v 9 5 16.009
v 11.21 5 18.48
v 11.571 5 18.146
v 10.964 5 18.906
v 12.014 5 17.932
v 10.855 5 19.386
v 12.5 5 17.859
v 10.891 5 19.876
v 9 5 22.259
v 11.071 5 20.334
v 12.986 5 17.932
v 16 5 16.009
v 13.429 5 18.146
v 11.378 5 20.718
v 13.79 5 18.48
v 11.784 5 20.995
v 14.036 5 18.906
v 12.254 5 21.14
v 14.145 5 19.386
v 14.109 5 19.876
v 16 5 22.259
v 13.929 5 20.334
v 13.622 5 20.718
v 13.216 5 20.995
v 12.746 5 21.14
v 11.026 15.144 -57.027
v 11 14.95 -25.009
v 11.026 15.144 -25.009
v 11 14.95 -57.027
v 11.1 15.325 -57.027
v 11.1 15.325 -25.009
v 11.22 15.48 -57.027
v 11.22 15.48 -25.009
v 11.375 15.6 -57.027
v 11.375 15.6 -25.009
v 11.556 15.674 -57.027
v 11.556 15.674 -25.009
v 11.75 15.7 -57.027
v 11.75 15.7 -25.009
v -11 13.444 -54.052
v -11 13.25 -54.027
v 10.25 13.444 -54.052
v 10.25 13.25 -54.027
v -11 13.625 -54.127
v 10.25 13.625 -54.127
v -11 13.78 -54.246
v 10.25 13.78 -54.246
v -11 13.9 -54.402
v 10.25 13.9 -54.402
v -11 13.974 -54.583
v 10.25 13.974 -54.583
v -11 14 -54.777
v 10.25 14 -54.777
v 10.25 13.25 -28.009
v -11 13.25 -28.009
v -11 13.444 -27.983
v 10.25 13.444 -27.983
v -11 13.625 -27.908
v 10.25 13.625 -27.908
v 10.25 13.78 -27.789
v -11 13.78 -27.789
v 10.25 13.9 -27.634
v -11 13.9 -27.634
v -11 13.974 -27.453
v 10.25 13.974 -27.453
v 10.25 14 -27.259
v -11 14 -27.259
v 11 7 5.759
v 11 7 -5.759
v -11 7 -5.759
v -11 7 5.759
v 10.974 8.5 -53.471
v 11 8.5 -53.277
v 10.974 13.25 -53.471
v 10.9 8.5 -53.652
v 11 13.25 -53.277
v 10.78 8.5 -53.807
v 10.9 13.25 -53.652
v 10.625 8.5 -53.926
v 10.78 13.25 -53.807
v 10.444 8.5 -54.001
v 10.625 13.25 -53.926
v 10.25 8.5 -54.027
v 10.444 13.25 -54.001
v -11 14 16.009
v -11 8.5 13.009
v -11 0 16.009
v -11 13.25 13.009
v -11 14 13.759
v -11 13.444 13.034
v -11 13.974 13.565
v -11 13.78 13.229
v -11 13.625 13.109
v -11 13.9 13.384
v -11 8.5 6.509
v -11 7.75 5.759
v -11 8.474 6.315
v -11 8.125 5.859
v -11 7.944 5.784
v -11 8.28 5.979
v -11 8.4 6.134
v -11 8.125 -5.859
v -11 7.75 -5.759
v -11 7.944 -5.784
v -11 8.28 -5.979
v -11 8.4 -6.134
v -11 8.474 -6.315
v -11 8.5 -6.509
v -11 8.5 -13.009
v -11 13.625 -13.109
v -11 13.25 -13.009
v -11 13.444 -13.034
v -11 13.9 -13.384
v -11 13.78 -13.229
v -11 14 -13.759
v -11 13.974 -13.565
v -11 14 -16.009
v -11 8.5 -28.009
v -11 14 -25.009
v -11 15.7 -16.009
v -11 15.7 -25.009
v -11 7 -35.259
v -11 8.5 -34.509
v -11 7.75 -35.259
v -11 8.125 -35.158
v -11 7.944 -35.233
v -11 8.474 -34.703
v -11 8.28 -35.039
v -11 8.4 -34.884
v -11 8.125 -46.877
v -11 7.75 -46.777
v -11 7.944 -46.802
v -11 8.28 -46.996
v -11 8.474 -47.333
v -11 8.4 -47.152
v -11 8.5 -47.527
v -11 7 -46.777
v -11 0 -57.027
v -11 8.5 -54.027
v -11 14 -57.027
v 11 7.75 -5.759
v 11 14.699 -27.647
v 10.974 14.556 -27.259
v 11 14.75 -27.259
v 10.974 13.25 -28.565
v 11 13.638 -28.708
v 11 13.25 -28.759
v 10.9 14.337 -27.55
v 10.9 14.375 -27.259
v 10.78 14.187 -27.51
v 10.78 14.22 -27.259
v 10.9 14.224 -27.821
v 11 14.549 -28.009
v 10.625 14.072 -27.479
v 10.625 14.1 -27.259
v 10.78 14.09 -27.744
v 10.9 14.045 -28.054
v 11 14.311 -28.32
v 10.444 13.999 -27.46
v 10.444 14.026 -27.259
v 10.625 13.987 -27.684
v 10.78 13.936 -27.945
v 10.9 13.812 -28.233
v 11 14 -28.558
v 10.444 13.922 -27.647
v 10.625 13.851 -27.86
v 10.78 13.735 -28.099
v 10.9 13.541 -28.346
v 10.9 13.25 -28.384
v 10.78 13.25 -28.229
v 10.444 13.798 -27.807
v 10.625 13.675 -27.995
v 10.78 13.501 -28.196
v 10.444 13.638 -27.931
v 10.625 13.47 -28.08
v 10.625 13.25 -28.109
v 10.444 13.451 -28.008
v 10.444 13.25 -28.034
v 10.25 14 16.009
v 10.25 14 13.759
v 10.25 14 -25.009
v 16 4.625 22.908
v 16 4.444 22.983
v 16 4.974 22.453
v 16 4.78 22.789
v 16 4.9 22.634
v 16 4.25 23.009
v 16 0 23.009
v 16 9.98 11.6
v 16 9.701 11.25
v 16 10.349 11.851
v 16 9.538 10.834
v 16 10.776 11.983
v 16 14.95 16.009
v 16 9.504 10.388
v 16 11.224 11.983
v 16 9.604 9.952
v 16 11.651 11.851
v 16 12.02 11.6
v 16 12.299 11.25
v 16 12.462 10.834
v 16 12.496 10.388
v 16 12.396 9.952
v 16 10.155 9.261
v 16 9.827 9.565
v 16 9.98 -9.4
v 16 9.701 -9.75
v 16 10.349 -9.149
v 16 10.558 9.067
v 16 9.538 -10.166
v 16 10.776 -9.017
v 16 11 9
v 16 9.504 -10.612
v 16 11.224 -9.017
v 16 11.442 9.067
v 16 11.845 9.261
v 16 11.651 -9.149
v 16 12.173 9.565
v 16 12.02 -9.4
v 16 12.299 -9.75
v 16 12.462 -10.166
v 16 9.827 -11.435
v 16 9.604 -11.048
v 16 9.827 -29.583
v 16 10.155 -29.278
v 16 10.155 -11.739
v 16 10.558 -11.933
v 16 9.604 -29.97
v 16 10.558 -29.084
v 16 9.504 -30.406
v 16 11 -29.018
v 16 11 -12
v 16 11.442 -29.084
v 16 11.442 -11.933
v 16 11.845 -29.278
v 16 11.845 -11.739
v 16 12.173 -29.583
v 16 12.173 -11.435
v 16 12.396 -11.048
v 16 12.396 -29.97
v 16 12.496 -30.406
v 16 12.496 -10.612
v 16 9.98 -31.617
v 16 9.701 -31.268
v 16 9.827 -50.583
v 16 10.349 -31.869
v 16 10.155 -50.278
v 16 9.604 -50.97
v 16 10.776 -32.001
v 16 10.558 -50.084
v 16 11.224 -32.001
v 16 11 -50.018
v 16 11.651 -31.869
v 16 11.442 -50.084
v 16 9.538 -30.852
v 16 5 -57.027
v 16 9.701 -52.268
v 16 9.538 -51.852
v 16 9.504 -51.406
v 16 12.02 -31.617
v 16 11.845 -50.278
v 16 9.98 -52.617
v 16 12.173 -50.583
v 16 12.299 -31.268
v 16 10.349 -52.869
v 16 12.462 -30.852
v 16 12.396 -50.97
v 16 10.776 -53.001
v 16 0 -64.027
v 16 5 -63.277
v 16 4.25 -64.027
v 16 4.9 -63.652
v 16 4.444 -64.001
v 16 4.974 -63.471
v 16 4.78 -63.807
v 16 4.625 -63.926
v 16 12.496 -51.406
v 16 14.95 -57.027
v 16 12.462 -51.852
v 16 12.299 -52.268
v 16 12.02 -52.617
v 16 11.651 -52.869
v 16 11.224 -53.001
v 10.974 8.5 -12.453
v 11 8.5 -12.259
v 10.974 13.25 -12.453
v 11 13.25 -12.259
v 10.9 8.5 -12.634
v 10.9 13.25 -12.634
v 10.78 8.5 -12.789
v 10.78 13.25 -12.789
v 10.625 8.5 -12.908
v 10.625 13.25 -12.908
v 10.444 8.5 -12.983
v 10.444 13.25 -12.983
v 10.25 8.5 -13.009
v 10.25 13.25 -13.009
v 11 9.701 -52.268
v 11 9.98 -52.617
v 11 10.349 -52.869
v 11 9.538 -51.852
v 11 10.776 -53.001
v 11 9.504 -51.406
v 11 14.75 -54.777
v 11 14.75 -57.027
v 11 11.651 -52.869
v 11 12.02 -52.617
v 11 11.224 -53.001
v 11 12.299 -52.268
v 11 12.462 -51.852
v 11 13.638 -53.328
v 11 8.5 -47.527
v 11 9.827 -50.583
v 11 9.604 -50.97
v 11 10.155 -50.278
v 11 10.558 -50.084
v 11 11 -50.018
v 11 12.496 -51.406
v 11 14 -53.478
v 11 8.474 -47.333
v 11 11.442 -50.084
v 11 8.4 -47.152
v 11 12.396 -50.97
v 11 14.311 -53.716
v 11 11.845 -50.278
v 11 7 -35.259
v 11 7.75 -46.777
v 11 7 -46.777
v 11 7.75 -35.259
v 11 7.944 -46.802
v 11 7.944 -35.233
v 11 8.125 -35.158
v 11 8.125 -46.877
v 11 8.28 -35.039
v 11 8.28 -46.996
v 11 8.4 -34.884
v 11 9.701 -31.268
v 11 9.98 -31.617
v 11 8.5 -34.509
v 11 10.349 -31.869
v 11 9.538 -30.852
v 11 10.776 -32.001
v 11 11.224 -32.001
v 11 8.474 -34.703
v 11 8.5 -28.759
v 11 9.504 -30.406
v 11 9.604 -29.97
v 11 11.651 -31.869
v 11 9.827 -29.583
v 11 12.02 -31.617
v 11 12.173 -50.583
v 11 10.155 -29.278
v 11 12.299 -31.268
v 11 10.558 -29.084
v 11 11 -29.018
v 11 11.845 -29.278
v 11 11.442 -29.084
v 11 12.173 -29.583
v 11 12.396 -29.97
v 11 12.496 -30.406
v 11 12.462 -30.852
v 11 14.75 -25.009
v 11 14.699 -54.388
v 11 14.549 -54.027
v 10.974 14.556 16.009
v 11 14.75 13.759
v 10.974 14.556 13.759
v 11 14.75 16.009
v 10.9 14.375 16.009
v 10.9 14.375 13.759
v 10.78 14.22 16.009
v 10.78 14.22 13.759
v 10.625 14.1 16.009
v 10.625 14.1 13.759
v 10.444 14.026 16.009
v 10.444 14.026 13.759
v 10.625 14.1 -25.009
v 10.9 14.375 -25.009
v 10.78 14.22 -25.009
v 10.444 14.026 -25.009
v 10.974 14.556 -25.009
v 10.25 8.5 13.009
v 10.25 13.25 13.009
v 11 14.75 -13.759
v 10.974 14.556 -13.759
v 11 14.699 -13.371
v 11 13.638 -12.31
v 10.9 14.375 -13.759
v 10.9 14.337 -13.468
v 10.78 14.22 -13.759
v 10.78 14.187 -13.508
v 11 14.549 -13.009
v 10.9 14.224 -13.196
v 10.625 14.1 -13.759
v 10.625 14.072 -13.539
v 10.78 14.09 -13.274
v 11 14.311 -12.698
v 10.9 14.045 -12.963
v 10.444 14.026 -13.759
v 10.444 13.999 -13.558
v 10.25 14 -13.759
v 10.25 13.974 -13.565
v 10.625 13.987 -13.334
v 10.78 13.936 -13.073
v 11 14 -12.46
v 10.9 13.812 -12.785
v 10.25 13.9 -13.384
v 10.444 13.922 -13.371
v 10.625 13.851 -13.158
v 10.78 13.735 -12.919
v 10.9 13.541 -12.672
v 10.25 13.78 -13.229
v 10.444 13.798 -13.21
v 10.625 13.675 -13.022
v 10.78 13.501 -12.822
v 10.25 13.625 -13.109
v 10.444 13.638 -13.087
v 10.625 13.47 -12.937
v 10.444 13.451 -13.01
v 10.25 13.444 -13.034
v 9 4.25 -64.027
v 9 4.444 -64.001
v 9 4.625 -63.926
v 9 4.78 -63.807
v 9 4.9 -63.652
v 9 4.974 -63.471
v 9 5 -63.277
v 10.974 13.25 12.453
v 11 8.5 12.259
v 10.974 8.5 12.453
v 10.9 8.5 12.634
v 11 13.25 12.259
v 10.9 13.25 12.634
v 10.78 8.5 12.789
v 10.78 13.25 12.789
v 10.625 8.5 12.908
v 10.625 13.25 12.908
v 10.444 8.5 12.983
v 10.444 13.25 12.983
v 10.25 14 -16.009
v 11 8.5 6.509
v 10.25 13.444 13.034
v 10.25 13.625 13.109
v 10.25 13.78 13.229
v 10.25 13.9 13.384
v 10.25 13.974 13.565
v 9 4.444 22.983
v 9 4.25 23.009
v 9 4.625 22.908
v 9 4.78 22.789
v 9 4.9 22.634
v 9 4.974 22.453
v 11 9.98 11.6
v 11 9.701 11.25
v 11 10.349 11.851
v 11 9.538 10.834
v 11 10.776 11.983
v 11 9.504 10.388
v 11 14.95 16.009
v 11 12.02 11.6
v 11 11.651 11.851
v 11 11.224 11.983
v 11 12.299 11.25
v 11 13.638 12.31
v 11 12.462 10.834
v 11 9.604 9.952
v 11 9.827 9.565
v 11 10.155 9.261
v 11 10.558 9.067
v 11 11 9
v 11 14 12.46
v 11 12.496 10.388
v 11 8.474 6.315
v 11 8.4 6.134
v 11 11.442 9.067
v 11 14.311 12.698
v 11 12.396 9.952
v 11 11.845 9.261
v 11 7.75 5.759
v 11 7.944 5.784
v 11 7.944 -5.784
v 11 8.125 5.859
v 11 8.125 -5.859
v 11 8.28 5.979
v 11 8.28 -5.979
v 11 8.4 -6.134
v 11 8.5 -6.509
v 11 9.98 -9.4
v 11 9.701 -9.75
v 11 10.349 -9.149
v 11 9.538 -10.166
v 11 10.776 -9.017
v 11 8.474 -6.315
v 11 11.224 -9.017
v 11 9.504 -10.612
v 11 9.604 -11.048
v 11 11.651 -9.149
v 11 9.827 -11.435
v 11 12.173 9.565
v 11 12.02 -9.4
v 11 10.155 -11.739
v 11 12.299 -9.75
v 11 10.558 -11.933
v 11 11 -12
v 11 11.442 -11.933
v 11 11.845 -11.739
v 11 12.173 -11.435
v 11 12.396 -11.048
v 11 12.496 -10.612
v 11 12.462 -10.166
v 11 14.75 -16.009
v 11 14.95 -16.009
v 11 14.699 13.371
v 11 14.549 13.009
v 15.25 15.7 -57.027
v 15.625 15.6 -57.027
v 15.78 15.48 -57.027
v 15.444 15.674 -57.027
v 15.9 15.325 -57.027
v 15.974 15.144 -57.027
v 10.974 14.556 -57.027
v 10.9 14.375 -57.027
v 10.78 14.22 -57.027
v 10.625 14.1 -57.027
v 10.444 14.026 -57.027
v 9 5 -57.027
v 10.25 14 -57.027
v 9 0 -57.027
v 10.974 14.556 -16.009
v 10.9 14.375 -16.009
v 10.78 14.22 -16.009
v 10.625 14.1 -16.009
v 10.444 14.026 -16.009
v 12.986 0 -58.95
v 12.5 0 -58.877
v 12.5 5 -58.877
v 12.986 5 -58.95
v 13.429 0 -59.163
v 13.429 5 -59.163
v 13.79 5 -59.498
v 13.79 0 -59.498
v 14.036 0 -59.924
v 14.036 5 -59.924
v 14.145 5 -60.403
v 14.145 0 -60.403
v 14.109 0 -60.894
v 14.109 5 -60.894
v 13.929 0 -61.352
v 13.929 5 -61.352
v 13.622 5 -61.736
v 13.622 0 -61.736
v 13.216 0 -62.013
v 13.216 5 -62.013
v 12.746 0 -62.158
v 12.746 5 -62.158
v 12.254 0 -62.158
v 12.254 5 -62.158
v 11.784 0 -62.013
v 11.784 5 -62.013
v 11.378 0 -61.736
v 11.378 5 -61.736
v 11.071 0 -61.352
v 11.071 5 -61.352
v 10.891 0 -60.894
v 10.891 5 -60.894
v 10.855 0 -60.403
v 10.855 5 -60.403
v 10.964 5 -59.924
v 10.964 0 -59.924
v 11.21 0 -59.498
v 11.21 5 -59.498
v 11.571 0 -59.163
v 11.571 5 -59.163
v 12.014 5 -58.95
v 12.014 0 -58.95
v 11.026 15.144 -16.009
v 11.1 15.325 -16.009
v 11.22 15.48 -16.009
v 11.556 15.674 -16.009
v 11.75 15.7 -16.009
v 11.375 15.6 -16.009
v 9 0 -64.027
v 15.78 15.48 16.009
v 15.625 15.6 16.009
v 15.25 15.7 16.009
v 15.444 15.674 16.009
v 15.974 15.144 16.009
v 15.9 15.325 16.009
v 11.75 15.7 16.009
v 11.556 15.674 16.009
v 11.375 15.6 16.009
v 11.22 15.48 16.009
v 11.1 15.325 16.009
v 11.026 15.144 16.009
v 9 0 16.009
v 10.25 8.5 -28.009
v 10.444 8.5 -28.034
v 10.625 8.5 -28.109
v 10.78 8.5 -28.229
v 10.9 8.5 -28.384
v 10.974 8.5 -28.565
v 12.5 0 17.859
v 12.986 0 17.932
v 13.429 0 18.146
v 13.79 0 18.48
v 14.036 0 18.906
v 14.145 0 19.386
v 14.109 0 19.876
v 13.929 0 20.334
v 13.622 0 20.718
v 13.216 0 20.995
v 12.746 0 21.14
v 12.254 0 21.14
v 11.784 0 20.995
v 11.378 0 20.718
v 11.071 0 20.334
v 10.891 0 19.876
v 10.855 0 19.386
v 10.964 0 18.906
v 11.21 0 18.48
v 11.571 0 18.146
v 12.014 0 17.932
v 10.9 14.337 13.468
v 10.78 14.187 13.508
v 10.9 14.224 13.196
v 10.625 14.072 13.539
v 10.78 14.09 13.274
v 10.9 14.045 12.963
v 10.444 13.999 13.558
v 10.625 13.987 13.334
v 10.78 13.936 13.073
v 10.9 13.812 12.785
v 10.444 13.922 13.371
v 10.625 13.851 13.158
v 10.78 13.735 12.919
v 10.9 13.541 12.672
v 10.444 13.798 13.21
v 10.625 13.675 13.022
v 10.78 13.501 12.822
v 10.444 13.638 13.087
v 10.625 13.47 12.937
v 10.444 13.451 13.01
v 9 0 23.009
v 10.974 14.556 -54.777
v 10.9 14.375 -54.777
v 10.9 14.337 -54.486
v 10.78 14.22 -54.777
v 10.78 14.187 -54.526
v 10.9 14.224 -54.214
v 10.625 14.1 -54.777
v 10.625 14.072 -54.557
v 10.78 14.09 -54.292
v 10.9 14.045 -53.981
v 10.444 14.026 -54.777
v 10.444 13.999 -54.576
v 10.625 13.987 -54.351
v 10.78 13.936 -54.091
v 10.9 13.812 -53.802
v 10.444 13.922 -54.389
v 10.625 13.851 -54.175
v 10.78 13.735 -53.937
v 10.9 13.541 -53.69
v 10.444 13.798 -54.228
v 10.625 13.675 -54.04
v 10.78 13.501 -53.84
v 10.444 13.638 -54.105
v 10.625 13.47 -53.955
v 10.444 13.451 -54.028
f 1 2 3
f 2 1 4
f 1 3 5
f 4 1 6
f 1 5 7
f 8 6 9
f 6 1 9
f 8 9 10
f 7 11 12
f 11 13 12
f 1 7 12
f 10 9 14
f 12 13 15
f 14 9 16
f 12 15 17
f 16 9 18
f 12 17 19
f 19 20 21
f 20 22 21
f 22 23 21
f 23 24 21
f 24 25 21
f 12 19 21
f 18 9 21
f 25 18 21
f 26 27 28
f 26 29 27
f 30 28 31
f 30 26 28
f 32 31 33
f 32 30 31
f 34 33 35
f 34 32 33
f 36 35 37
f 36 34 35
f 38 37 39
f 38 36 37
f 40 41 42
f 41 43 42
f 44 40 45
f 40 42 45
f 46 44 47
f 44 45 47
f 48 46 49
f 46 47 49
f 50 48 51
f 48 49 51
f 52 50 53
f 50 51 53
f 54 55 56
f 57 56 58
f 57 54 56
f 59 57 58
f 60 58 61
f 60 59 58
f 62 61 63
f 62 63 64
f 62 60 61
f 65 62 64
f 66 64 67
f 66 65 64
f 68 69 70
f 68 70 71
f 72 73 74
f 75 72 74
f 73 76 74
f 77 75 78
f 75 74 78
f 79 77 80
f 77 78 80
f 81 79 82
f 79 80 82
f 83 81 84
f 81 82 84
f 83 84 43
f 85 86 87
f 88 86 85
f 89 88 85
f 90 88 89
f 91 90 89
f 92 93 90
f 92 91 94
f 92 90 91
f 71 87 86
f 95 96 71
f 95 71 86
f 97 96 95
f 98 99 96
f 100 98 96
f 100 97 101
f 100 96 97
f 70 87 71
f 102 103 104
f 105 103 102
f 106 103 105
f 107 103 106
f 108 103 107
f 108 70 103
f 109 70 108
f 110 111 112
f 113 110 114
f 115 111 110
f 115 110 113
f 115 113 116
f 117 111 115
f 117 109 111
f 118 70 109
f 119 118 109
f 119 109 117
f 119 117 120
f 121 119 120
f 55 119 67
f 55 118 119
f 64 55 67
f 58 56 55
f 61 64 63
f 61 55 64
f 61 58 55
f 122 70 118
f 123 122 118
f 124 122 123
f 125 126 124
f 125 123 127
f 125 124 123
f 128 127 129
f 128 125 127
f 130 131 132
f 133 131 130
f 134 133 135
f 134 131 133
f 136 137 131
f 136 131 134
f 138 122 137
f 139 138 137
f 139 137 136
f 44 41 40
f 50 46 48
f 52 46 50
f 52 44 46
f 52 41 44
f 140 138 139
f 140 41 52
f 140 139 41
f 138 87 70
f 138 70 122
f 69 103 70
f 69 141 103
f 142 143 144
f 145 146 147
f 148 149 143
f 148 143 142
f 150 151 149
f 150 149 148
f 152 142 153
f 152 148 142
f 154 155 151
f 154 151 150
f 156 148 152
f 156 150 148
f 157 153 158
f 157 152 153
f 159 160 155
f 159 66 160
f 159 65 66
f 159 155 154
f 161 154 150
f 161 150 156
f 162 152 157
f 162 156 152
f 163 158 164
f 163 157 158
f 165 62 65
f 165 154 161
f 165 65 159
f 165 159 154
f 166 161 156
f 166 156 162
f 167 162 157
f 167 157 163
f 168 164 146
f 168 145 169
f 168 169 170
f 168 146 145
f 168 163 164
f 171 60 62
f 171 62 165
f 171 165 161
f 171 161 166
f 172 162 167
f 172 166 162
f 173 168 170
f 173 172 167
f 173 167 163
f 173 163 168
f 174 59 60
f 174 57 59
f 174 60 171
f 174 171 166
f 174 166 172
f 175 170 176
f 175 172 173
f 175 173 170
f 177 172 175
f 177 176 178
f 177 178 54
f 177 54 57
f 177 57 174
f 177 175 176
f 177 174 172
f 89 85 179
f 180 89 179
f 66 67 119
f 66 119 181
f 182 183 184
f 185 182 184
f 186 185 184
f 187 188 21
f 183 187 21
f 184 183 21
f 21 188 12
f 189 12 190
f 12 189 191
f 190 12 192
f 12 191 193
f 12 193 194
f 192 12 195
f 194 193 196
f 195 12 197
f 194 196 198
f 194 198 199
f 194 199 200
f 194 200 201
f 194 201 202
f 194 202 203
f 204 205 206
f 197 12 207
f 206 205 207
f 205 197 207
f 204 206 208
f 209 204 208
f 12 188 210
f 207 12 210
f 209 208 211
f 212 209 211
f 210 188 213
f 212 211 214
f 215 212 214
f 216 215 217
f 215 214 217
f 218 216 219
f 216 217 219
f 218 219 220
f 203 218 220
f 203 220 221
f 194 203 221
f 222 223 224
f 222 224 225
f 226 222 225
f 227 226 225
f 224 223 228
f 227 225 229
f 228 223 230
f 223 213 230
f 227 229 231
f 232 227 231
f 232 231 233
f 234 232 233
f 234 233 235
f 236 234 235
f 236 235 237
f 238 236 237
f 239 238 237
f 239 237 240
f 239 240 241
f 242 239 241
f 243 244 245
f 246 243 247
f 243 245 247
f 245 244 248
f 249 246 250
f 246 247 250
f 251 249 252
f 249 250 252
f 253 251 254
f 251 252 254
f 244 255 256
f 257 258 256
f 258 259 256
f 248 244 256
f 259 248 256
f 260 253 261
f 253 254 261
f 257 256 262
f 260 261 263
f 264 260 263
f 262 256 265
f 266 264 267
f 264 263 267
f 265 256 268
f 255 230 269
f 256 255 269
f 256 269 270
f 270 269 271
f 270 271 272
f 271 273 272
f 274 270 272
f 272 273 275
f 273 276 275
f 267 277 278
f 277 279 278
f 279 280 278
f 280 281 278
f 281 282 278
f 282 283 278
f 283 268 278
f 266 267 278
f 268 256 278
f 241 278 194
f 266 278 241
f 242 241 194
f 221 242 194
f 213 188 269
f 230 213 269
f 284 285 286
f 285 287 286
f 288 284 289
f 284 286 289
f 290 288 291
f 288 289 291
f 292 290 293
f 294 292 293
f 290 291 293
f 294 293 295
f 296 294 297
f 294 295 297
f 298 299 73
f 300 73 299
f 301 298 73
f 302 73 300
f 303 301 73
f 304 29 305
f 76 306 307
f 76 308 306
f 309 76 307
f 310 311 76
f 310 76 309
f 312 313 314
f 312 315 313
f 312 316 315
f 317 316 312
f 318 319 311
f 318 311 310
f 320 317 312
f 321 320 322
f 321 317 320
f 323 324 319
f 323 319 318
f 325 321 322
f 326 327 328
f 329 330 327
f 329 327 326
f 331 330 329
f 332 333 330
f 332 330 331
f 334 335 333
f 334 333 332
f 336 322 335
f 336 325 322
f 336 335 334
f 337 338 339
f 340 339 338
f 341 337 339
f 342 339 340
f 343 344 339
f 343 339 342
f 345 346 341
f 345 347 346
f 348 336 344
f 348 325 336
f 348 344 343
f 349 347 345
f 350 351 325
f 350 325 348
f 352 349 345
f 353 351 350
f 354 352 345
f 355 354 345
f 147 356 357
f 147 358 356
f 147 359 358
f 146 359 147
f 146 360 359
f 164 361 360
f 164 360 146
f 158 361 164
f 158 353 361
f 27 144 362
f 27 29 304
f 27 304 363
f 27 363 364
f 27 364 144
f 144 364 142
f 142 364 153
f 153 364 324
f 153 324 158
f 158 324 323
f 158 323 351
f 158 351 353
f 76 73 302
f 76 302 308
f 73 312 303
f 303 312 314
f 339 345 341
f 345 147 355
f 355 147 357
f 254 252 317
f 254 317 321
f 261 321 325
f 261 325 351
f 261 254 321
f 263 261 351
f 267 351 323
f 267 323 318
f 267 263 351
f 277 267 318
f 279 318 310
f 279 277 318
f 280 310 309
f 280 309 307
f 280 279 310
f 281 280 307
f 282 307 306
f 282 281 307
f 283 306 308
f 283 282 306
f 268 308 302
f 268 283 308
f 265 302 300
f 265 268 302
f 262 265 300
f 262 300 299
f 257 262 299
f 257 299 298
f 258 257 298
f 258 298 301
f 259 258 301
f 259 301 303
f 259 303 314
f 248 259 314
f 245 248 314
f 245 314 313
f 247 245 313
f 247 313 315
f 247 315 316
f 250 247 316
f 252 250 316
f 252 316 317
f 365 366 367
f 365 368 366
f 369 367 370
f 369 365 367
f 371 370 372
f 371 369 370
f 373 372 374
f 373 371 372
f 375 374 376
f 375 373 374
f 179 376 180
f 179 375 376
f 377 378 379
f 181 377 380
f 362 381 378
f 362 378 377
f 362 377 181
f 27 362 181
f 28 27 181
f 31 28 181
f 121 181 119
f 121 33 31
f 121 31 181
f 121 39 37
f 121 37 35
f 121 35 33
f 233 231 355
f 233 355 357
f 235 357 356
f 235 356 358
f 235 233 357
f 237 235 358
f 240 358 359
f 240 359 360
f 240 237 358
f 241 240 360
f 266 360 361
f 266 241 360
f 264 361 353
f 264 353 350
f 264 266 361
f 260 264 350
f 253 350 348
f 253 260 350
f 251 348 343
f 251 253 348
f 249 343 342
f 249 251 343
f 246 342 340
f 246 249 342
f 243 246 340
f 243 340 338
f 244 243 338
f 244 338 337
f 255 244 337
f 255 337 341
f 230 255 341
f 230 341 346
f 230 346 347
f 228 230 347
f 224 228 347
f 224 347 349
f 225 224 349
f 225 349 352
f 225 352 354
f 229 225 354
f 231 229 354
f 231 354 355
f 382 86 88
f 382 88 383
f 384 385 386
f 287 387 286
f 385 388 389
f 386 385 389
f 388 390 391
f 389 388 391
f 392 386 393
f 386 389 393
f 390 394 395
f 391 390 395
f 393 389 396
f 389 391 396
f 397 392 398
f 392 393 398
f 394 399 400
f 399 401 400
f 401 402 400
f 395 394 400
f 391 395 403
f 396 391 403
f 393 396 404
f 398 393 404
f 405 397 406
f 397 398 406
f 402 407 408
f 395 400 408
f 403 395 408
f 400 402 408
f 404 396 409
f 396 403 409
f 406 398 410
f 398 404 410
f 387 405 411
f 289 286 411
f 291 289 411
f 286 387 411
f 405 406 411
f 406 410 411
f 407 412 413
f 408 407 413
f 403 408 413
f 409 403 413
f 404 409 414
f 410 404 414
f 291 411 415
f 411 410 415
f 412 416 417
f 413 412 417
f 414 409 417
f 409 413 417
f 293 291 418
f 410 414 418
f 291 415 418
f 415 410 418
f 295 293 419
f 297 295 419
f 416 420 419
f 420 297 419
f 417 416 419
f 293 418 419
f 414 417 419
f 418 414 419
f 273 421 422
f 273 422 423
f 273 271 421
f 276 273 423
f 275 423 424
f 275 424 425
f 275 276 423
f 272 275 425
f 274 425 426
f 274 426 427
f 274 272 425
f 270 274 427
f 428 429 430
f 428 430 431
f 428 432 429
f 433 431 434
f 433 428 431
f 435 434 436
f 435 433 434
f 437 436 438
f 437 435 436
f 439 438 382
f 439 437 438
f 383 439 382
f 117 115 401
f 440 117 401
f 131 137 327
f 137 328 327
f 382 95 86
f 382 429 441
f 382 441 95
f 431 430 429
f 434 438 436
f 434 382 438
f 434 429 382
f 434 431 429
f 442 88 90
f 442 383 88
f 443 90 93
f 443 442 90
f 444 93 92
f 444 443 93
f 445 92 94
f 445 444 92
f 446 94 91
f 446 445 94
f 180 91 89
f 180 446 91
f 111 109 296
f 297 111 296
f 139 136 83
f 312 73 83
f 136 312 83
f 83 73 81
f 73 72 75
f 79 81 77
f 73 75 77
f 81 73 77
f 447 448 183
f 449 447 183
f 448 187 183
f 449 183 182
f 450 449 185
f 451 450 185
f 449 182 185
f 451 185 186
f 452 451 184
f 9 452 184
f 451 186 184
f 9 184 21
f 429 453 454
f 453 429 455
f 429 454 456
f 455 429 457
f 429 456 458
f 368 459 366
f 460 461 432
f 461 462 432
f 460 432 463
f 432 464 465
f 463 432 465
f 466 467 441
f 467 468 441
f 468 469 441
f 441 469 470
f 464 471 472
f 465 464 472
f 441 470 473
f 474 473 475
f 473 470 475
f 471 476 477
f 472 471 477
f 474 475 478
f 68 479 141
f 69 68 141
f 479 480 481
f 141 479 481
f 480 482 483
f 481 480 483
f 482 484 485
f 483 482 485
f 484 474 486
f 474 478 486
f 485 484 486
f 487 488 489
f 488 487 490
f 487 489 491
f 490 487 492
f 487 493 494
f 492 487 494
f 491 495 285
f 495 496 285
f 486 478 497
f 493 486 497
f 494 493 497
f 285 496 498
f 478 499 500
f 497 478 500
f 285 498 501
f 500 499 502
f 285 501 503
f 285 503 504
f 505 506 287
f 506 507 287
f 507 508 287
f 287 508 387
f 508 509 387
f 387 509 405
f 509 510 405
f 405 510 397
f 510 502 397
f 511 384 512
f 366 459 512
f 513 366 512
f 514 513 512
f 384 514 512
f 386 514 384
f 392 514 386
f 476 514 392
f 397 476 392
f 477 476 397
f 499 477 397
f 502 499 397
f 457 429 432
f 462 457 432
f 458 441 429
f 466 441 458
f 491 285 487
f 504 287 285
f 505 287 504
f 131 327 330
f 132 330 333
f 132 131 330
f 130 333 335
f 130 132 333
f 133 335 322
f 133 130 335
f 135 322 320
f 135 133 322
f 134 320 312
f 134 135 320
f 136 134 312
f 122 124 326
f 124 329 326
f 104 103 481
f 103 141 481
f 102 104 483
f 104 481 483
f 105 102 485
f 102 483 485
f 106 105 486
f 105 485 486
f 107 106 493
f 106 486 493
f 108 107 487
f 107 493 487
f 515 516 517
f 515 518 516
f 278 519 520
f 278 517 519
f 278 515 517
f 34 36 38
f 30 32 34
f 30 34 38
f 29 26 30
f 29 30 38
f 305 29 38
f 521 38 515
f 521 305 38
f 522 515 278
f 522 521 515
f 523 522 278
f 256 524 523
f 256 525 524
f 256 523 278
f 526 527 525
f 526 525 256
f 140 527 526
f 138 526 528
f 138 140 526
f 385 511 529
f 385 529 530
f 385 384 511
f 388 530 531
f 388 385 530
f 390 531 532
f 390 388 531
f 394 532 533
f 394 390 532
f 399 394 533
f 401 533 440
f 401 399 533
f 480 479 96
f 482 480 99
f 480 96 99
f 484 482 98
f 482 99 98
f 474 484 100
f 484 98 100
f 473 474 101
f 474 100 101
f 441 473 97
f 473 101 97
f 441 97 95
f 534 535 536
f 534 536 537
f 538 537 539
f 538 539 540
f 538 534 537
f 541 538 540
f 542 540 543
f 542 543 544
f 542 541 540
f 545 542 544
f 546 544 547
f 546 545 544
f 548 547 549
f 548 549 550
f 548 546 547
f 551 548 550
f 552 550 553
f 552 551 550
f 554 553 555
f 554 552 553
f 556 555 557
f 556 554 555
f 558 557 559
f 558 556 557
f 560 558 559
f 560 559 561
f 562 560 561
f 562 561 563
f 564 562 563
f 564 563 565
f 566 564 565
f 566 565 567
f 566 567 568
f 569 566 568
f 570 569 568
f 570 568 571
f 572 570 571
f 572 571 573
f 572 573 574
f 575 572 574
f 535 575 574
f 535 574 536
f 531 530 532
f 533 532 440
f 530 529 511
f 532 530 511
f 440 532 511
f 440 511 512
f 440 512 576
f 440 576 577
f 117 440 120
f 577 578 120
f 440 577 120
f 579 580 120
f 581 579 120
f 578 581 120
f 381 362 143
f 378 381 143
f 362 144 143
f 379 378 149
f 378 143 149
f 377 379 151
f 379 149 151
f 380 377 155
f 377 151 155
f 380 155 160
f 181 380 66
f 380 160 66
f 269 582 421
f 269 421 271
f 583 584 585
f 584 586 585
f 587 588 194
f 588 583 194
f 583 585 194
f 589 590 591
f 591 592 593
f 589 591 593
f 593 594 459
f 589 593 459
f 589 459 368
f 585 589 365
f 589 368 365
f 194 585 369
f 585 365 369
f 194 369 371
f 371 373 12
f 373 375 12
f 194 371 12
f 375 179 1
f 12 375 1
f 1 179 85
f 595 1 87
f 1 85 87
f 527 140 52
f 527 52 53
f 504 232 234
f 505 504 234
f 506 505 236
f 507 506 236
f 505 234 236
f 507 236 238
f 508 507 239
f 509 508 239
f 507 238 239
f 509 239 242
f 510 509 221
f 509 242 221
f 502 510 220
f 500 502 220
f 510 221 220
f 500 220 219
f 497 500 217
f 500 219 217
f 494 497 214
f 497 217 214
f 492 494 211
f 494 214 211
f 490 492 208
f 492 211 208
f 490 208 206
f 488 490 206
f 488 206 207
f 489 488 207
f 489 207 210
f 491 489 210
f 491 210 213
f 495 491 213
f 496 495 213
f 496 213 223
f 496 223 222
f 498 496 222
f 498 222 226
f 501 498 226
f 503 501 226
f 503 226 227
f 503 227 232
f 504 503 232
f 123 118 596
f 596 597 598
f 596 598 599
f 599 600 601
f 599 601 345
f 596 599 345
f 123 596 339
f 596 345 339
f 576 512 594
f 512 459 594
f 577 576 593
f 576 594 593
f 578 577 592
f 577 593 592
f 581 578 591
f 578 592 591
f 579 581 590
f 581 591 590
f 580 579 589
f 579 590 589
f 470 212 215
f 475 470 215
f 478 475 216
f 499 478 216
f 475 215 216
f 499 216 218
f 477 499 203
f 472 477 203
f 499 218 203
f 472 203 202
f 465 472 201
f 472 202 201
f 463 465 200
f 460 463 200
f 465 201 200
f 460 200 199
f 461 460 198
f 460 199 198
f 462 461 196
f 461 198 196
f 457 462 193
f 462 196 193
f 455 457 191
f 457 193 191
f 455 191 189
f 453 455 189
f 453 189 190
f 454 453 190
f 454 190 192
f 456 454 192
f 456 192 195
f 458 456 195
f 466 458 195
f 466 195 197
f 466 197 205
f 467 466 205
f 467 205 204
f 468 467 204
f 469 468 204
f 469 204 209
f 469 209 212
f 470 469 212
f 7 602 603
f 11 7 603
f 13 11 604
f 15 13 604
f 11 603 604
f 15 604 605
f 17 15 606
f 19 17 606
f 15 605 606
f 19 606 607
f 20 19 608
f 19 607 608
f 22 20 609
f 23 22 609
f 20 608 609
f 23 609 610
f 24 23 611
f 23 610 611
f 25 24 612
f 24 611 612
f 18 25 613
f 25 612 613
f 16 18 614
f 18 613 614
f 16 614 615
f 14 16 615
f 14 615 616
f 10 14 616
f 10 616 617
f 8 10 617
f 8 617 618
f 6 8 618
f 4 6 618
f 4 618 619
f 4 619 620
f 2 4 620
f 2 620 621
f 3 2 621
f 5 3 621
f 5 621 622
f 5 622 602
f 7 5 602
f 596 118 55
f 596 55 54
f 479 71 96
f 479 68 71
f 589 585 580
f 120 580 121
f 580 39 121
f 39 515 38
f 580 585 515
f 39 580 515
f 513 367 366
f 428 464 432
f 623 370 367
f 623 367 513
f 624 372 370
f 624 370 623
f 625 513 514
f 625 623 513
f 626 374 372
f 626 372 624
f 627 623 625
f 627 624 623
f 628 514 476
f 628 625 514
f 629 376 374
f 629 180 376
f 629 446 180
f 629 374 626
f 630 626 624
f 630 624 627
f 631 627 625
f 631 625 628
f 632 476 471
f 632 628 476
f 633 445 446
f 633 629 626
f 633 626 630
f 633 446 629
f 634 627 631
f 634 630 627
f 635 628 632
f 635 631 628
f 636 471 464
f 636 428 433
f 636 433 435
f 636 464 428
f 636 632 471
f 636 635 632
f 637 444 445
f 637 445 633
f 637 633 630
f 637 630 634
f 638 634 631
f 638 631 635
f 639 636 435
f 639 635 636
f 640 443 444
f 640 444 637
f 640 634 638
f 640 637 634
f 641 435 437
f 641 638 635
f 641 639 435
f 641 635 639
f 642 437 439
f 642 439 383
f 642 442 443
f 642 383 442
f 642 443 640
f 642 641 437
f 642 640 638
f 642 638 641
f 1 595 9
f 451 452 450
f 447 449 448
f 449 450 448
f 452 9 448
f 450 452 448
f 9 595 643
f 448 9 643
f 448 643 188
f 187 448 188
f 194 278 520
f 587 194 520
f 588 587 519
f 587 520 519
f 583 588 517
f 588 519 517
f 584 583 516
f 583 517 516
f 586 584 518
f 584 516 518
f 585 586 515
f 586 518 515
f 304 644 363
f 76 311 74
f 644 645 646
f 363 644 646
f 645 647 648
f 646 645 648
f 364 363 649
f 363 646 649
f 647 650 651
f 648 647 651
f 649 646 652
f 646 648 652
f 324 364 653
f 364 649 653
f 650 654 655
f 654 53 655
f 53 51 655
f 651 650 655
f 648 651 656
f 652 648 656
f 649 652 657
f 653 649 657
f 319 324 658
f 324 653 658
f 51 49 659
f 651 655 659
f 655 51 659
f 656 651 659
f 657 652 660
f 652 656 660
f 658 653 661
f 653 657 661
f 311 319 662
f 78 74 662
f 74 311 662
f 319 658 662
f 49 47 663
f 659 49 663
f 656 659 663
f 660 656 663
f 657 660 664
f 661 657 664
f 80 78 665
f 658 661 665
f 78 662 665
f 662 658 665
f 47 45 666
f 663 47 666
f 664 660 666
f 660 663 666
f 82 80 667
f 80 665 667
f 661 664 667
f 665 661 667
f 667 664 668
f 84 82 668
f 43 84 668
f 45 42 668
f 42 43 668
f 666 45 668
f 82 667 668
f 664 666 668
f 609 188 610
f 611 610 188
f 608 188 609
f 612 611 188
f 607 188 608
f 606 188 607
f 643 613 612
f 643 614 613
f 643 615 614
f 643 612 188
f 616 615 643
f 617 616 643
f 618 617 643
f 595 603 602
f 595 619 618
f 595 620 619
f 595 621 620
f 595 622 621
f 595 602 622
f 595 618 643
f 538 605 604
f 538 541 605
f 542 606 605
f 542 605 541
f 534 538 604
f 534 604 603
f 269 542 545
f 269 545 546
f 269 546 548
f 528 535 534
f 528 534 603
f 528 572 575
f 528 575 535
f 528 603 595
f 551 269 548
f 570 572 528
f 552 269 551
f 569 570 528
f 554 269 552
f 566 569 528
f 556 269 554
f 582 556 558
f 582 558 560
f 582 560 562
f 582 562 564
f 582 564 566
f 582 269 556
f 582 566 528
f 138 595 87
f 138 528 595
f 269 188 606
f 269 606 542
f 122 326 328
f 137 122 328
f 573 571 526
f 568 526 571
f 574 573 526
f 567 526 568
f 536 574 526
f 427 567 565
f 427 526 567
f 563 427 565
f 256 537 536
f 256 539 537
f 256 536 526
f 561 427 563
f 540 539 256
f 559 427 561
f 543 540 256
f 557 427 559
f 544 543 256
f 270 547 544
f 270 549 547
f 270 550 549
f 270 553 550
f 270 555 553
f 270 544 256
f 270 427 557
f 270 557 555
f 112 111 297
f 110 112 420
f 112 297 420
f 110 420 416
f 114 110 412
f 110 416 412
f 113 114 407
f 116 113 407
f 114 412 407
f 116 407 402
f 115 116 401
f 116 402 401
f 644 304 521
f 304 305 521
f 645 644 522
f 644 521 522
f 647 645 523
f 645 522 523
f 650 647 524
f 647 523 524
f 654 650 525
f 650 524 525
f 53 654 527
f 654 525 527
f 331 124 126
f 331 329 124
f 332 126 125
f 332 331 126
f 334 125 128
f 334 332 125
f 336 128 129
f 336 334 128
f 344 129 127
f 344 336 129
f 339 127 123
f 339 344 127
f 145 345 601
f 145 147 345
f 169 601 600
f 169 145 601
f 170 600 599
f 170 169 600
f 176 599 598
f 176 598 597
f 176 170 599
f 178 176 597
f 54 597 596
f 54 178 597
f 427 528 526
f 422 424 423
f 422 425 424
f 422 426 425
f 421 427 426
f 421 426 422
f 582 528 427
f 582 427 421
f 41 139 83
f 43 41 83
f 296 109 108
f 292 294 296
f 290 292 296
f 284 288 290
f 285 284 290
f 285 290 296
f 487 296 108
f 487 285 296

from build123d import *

# Parameters (mm, degrees)
BOSS_EXTRUDE1_DEPTH = 11
SKETCH3_W           = 22
SKETCH3_H           = 3
BOSS_EXTRUDE2_DEPTH = 14
BOSS_EXTRUDE3_DEPTH = 5
SKETCH5_R           = 1.5
CUT_EXTRUDE1_DEPTH  = 36.096650541
SKETCH6_W           = 7
SKETCH6_H           = 7
BOSS_EXTRUDE4_DEPTH = 5
SKETCH10_R          = 1.65
CUT_EXTRUDE2_DEPTH  = 33.123192233
SKETCH8_W           = 27
SKETCH8_H           = 15.7
BOSS_EXTRUDE5_DEPTH = 4.5
FILLET1_R           = 0.75


with BuildPart() as part:
    # Sketch1 → Boss-Extrude1 (new, symmetric)
    with BuildSketch(Plane(origin=(0, 0, 0), x_dir=(0, 0, -1), z_dir=(1, 0, 0))):
        Polygon((-13.0089, 0), (13.0089, 0), (13.0089, 8.5), (5.7589, 8.5), (5.7589, 7), (-5.7589, 7), (-5.7589, 8.5), (-13.0089, 8.5), align=None)
    extrude(amount=BOSS_EXTRUDE1_DEPTH, both=True)

    # Sketch3 → Boss-Extrude2 (add)
    with BuildSketch(Plane.XZ):
        with Locations((0, -14.5089)):
            Rectangle(SKETCH3_W, SKETCH3_H)
        with Locations((0, 14.5089)):
            Rectangle(SKETCH3_W, SKETCH3_H)
    extrude(amount=-BOSS_EXTRUDE2_DEPTH)

    # Sketch4 → Boss-Extrude3 (add)
    with BuildSketch(Plane(origin=(11, 0, 0), x_dir=(0, 0, -1), z_dir=(1, 0, 0))):
        Polygon((-8.8, 15.7), (-16.0089, 15.7), (-16.0089, 0), (16.0089, 0), (16.0089, 15.7), align=None)
    extrude(amount=BOSS_EXTRUDE3_DEPTH)

    # Sketch5 → Cut-Extrude1 (cut, through all)
    with BuildSketch(Plane(origin=(16, 0, 0), x_dir=(0, 0, -1), z_dir=(1, 0, 0))):
        with Locations((-10.5, 11)):
            Circle(SKETCH5_R)
        with Locations((10.5, 11)):
            Circle(SKETCH5_R)
    extrude(amount=-CUT_EXTRUDE1_DEPTH, mode=Mode.SUBTRACT)

    # Sketch6 → Boss-Extrude4 (add)
    with BuildSketch(Plane.XZ):
        with Locations((12.5, 19.5089)):
            Rectangle(SKETCH6_W, SKETCH6_H)
    extrude(amount=-BOSS_EXTRUDE4_DEPTH)

    # Sketch10 → Cut-Extrude2 (cut, through all)
    with BuildSketch(Plane.XZ):
        with Locations(Location((12.5, 19.5089, 0), (0, 0, 270))):
            Circle(SKETCH10_R)
    extrude(amount=-CUT_EXTRUDE2_DEPTH, mode=Mode.SUBTRACT)

    # Sketch8 → Boss-Extrude5 (add)
    with BuildSketch(Plane(origin=(0, 0, -16.0089), x_dir=(-1, 0, 0), z_dir=(0, 0, -1))):
        with Locations((-2.5, 7.85)):
            Rectangle(SKETCH8_W, SKETCH8_H)
    extrude(amount=BOSS_EXTRUDE5_DEPTH)

    # Fillet1
    fillet1_edges = [part.edges().sort_by_distance(p)[0] for p in [
        (0, 8.5, 5.7589),
        (0, 8.5, -5.7589),
        (0, 14, -13.0089),
        (11, 14, -14.5089),
        (11, 11.25, -13.0089),
        (11, 14, 14.5089),
        (11, 11.25, 13.0089),
        (0, 14, 13.0089),
        (11, 15.7, 0),
        (16, 15.7, -2.25),
        (12.5, 5, 23.0089),
    ]]
    fillet(fillet1_edges, radius=FILLET1_R)

    # Mirror6: part across plane


with BuildPart() as part_1:
    add(part.part)
    add(part.part.mirror(Plane(origin=(0, 0, -20.5089), x_dir=(1, 0, 0), z_dir=(0, 0, -1))))


solid = part_1.part
